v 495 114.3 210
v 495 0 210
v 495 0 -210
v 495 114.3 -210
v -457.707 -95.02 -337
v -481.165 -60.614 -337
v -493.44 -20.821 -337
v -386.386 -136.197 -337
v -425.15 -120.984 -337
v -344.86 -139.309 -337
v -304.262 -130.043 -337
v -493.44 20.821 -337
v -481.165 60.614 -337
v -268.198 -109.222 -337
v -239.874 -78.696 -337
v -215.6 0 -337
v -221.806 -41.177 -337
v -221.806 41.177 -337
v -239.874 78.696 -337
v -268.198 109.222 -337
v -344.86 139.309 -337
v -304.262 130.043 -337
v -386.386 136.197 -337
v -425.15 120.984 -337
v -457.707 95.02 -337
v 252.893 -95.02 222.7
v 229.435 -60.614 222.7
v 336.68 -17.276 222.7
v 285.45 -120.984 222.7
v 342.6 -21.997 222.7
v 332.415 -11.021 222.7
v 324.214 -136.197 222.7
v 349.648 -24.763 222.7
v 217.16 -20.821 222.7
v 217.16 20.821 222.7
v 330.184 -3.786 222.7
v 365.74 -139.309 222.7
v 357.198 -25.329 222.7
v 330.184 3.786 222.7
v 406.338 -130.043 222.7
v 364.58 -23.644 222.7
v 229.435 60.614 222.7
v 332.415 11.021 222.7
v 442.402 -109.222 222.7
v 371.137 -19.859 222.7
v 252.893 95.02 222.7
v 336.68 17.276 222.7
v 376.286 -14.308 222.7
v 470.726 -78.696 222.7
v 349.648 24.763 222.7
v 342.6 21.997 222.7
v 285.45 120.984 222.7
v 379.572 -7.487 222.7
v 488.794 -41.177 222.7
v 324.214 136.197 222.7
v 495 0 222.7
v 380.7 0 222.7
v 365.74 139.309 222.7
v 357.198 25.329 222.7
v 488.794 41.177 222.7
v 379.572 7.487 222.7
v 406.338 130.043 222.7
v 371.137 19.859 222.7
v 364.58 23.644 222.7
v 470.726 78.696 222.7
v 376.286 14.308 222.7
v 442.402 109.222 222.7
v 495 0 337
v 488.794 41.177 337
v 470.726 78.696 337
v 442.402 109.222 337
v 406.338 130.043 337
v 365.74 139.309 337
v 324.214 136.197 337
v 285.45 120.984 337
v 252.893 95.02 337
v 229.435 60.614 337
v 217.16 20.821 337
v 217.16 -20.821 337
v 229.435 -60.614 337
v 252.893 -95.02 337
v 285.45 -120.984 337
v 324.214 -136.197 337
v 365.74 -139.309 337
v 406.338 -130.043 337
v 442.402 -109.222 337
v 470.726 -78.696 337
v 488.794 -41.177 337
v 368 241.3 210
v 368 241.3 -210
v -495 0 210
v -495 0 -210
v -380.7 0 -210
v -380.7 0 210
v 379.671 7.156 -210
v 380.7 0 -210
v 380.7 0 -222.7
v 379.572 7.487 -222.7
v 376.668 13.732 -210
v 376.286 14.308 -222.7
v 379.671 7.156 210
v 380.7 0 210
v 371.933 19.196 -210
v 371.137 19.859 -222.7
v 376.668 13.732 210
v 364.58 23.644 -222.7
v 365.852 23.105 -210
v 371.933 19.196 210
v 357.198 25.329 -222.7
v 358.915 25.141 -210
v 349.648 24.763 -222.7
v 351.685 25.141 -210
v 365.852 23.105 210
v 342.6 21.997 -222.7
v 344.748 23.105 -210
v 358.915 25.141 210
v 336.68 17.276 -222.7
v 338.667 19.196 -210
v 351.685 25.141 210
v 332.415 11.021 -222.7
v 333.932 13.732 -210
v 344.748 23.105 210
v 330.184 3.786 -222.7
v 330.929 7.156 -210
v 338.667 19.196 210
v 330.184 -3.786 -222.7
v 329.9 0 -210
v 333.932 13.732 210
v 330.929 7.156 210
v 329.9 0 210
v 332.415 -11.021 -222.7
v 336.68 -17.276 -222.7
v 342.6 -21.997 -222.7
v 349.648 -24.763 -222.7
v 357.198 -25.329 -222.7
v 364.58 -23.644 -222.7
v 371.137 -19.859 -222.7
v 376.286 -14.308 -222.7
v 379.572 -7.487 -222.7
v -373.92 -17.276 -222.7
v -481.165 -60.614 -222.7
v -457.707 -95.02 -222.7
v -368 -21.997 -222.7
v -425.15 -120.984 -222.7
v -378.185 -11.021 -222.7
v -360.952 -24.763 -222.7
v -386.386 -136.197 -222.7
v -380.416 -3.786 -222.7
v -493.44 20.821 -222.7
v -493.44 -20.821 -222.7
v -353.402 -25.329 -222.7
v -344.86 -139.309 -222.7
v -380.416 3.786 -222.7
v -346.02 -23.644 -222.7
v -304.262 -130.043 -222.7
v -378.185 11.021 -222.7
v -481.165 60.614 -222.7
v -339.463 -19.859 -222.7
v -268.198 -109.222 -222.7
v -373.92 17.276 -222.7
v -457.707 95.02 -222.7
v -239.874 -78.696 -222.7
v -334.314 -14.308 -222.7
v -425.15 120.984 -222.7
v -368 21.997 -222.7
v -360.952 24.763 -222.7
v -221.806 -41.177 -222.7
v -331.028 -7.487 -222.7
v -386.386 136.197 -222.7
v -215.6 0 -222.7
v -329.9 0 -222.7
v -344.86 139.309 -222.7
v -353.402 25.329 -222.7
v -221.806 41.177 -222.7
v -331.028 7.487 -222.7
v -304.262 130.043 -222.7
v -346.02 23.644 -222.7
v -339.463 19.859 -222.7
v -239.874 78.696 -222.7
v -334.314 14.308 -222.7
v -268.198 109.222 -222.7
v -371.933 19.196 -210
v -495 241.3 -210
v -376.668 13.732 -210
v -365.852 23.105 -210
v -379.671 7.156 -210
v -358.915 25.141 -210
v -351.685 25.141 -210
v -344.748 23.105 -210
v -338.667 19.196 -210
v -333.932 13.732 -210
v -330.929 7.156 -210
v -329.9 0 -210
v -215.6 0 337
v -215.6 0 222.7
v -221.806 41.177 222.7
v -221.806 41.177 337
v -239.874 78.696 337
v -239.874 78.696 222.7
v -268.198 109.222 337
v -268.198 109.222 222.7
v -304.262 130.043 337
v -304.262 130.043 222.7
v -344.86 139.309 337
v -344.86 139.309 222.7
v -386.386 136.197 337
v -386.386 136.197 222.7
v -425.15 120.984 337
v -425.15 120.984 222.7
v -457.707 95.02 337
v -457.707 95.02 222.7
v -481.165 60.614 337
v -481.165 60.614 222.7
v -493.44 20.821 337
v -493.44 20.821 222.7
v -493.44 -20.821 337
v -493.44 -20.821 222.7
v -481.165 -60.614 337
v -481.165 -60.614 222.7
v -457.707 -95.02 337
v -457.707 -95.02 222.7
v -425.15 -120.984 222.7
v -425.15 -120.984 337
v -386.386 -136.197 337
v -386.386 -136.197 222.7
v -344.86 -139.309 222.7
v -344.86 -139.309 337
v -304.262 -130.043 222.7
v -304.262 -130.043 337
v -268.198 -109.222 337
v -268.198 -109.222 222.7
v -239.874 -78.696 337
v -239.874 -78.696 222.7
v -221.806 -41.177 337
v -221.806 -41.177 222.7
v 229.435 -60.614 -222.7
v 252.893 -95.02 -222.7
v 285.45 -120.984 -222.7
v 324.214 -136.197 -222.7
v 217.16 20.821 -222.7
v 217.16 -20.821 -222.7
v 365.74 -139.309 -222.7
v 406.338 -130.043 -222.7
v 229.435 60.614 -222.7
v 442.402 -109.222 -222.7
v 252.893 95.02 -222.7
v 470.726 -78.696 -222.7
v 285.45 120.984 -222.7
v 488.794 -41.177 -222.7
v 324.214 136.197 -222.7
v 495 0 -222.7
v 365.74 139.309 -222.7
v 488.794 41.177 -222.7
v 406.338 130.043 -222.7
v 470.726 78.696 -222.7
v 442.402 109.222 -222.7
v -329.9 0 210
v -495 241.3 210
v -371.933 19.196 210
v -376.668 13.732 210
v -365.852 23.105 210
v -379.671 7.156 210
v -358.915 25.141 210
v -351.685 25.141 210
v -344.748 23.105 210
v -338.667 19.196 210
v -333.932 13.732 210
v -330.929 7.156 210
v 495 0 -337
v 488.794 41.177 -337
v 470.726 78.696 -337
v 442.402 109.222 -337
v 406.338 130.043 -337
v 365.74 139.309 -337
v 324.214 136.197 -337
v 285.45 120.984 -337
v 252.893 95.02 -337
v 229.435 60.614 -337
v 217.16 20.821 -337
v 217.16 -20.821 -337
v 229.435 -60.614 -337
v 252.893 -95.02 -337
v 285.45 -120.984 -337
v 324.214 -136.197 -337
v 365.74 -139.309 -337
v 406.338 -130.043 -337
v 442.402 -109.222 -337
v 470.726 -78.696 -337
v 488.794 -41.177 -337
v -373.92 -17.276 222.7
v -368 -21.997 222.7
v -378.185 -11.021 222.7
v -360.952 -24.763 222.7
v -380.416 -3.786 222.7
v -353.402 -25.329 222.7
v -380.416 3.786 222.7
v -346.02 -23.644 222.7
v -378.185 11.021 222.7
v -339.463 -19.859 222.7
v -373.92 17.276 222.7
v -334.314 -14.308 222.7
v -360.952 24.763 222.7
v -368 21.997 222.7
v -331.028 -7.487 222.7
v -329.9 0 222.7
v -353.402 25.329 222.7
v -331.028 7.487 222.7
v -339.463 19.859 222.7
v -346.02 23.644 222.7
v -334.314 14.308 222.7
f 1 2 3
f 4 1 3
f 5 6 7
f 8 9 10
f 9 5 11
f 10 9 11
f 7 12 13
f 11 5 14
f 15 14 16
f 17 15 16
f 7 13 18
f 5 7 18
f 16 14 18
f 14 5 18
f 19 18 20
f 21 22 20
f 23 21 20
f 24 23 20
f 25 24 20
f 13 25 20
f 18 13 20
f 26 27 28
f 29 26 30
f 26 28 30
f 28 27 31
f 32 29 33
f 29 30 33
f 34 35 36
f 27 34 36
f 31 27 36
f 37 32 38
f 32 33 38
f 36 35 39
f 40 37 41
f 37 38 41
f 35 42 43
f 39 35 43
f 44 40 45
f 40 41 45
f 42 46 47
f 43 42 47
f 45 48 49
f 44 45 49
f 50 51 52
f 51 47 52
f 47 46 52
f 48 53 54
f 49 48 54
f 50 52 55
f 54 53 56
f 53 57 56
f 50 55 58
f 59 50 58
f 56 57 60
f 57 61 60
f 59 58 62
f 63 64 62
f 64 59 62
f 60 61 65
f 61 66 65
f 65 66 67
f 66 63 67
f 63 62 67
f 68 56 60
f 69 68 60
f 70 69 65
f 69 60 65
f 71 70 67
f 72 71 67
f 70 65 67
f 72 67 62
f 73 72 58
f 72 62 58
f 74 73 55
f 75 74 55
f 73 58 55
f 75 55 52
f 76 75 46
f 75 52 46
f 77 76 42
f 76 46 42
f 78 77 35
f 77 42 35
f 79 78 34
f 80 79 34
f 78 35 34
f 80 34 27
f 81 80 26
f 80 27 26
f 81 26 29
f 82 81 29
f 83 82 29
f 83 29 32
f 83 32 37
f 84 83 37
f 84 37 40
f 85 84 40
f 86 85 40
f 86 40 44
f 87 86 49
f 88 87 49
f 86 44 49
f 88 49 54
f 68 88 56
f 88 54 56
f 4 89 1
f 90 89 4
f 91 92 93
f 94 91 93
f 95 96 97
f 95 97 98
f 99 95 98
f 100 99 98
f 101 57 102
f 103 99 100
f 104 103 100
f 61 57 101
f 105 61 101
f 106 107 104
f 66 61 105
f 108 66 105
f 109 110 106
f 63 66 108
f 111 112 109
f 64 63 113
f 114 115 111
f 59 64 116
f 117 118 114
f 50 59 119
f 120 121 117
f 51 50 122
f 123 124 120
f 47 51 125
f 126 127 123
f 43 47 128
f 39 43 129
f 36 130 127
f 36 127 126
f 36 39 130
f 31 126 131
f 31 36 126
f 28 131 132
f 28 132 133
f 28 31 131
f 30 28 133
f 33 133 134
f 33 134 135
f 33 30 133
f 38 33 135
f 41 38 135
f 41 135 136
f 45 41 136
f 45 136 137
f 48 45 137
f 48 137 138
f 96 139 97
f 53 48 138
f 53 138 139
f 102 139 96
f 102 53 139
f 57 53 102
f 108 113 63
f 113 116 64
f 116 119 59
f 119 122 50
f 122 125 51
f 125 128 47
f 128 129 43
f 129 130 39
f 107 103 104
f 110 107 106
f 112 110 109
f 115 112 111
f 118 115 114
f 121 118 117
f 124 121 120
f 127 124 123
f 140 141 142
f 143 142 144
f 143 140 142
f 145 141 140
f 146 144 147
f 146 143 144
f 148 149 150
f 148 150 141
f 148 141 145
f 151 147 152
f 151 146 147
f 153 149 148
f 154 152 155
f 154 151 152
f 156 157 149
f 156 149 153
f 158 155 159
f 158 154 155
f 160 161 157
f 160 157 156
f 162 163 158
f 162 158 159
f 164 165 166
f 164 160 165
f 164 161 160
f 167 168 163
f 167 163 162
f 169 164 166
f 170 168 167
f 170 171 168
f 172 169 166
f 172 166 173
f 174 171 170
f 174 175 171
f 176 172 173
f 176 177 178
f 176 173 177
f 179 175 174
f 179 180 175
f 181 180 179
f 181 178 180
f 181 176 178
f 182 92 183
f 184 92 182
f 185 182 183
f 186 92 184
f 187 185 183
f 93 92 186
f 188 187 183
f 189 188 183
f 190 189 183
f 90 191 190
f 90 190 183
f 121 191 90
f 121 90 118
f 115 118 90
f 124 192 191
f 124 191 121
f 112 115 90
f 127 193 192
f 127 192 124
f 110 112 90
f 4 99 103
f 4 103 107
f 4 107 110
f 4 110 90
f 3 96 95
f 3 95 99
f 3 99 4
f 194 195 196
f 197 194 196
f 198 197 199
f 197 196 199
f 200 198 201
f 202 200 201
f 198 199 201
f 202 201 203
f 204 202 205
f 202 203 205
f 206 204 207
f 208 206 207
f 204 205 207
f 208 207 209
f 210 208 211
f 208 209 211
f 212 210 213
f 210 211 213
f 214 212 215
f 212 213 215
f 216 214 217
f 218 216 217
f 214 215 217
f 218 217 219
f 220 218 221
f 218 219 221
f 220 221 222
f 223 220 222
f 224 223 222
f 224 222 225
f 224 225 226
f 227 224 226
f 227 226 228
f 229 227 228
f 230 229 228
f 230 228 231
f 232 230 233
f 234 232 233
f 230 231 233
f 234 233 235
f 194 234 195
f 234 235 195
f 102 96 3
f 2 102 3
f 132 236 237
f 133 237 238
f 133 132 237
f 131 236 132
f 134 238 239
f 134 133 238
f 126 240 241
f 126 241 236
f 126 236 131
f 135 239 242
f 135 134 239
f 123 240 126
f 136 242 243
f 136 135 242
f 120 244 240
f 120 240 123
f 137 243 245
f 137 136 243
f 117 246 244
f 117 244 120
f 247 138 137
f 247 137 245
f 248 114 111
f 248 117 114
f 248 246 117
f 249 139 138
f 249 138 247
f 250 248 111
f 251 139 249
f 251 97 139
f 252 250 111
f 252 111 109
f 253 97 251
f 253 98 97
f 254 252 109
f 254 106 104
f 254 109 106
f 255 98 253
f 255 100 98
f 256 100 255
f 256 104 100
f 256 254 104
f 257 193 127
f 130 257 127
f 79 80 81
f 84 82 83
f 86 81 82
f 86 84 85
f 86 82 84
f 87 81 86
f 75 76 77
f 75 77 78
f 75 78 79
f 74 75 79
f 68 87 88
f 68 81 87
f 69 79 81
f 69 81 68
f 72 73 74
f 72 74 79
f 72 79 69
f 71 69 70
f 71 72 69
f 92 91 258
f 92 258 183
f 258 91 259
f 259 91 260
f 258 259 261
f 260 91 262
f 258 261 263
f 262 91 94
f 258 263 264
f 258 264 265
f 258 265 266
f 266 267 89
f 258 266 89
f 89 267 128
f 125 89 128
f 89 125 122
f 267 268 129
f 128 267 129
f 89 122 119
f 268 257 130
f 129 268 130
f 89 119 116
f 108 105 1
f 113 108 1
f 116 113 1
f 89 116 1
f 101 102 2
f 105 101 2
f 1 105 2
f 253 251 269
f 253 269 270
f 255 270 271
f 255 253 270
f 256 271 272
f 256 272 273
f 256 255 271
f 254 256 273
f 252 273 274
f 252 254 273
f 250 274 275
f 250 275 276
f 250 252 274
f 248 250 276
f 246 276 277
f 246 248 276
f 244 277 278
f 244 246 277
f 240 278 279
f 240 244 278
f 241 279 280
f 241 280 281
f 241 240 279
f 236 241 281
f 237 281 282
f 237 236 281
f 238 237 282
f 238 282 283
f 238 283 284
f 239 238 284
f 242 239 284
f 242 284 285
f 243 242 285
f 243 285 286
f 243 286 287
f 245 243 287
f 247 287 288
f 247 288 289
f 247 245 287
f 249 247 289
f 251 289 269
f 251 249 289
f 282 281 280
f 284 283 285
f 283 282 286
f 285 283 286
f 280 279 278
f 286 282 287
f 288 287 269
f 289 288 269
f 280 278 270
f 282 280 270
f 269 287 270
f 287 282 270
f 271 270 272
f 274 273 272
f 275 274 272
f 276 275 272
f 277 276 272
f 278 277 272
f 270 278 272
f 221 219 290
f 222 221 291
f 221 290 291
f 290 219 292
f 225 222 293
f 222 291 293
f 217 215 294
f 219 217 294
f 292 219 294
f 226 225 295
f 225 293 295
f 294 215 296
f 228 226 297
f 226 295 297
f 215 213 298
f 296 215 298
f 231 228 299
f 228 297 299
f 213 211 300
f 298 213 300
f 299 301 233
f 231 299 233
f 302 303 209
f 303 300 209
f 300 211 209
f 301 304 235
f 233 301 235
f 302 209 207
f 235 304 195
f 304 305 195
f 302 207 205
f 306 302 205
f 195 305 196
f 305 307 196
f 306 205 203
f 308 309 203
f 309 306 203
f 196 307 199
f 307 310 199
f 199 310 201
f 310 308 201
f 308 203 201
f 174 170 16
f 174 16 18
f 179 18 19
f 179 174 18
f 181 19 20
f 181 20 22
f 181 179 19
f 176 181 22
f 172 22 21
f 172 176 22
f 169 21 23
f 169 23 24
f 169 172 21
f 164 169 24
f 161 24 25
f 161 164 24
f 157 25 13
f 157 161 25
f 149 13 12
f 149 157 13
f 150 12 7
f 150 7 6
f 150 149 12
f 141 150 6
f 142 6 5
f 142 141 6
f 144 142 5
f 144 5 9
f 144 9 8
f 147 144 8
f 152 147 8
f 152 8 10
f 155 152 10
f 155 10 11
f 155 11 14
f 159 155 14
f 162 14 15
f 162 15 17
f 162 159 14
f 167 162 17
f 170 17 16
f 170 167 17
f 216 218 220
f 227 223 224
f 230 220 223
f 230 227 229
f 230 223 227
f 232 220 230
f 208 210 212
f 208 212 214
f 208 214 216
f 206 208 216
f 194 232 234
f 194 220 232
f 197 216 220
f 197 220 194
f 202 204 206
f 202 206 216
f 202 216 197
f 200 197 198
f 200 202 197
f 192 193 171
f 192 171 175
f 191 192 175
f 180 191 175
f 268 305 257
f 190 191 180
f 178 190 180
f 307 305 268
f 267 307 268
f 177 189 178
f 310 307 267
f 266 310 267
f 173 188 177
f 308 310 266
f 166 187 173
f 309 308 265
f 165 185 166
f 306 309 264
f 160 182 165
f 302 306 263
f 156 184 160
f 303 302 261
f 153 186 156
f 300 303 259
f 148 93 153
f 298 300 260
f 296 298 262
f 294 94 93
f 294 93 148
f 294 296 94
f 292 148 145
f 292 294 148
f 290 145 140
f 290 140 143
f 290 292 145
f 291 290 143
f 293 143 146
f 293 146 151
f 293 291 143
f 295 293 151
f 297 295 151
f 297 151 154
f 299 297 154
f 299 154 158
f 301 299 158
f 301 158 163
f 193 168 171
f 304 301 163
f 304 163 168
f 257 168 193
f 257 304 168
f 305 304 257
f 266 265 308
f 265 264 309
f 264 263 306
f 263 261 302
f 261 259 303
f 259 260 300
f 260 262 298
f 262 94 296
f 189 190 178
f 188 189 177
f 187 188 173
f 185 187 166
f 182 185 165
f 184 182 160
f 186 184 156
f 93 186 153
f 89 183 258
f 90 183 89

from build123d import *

# Parameters (mm, degrees)
SKETCH1_W             = 990
SKETCH1_H             = 420
BOSS_EXTRUDE1_DEPTH   = 241.3
BOSS_EXTRUDE2_START   = 12.7
SKETCH2_R             = 139.7
BOSS_EXTRUDE2_DEPTH   = 114.3
BOSS_EXTRUDE2_2_DEPTH = 114.3
BOSS_EXTRUDE3_REACH   = 872.36
SKETCH3_R             = 25.4
CHAMFER1_SIZE         = 127


with BuildPart() as part:
    # Sketch1 → Boss-Extrude1 (new body)
    with BuildSketch(Plane(origin=(0, 0, 0), x_dir=(1, 0, 0), z_dir=(0, 1, 0))):
        Rectangle(SKETCH1_W, SKETCH1_H)
    extrude(amount=BOSS_EXTRUDE1_DEPTH)


with BuildPart() as body_2:
    # Sketch2 → Boss-Extrude2 (new body)
    with BuildSketch(Plane.XY.offset(210).offset(BOSS_EXTRUDE2_START)):
        with Locations((-355.3, 0)):
            Circle(SKETCH2_R)
    extrude(amount=BOSS_EXTRUDE2_DEPTH)


with BuildPart() as body_3:
    # Sketch2 → Boss-Extrude2 2 (new body)
    with BuildSketch(Plane.XY.offset(210).offset(BOSS_EXTRUDE2_START)):
        with Locations((355.3, 0)):
            Circle(SKETCH2_R)
    extrude(amount=BOSS_EXTRUDE2_2_DEPTH)


with BuildPart() as body_4:
    # Mirror2: mirrored copy
    add(body_3.part.mirror(Plane.XY))

    # Boss-Extrude3: up to this face of the body (flat: up to its plane)
    boss_extrude3_end = Plane(body_4.part.faces().sort_by_distance((355.3, 0, -337))[0])
    # Sketch3 → Boss-Extrude3 (add, up to the picked face)
    with BuildSketch(Plane.XY.offset(337), mode=Mode.PRIVATE) as boss_extrude3_sk1:
        with Locations((-355.3, 0)):
            Circle(SKETCH3_R)
    boss_extrude3_tool1 = split(extrude(boss_extrude3_sk1.sketch, amount=-BOSS_EXTRUDE3_REACH, mode=Mode.PRIVATE), bisect_by=boss_extrude3_end, keep=Keep.BOTH, mode=Mode.PRIVATE)
    # Sketch3 → Boss-Extrude3 (add, up to the picked face)
    with BuildSketch(Plane.XY.offset(337), mode=Mode.PRIVATE) as boss_extrude3_sk2:
        with Locations((355.3, 0)):
            Circle(SKETCH3_R)
    boss_extrude3_tool2 = split(extrude(boss_extrude3_sk2.sketch, amount=-BOSS_EXTRUDE3_REACH, mode=Mode.PRIVATE), bisect_by=boss_extrude3_end, keep=Keep.BOTH, mode=Mode.PRIVATE)

    add(part.part)  # Boss-Extrude3 merges part

    add(body_2.part)  # Boss-Extrude3 merges body 2

    add(body_3.part)  # Boss-Extrude3 merges body 3


with BuildPart() as body_5:
    # Mirror2 2: mirrored copy
    add(body_2.part.mirror(Plane.XY))


with BuildPart() as body_4_1:
    add(body_4.part)

    add(body_5.part)  # Boss-Extrude3 merges body 5
    add(boss_extrude3_tool1.solids().sort_by(Axis((-355.3, 0, 337), (0, 0, -1)))[0])
    add(boss_extrude3_tool2.solids().sort_by(Axis((355.3, 0, 337), (0, 0, -1)))[0])

    # Chamfer1
    chamfer1_edges = [body_4_1.edges().sort_by_distance(p)[0] for p in [
        (495, 241.3, 0),
    ]]
    chamfer(chamfer1_edges, length=CHAMFER1_SIZE)


solid = body_4_1.part
